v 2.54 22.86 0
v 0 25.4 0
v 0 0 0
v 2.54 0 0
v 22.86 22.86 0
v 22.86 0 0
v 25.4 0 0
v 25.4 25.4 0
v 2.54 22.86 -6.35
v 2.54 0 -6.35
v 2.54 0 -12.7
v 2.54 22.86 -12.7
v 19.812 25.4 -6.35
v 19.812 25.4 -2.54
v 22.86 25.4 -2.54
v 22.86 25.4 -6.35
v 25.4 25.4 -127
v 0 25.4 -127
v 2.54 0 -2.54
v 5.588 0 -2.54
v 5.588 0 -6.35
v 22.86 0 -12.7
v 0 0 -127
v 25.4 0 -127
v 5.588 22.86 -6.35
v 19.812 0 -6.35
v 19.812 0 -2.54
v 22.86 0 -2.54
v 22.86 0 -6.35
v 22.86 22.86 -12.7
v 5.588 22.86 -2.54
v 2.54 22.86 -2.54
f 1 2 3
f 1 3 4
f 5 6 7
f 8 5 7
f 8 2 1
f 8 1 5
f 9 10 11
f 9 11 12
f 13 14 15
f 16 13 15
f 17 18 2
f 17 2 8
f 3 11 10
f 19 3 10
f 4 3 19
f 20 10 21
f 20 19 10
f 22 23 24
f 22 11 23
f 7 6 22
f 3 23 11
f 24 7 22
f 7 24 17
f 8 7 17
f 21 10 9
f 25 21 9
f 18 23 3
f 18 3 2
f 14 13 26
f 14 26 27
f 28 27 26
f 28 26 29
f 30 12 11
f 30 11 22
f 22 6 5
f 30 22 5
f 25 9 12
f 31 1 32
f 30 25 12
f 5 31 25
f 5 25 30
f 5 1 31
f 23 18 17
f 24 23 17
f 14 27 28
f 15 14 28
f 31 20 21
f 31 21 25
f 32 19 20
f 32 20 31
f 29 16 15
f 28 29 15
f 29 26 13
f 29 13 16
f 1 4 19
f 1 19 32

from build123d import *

# Parameters (mm, degrees)
F0_W     = 25.4
F0_H     = 25.4
F1_DEPTH = 127
F2_W     = 20.32
F2_H     = 22.86
F3_DEPTH = 12.7
F4_W     = 22.86
F4_H     = 3.81
F5_DEPTH = 3.048
F6_W     = 3.048
F6_H     = 3.81
F7_DEPTH = 25.4


with BuildPart() as f1:
    # F0 (on Top) → F1 (new body)
    with BuildSketch(Plane.XY):
        with Locations((12.7, 12.7)):
            Rectangle(F0_W, F0_H)
    extrude(amount=-F1_DEPTH)

    # F2 (on face) → F3 (cut)
    with BuildSketch(Plane.XY):
        with Locations((12.7, 11.43)):
            Rectangle(F2_W, F2_H)
    extrude(amount=-F3_DEPTH, mode=Mode.SUBTRACT)

    # F4 (on face) → F5 (join)
    with BuildSketch(Plane.YZ.offset(2.54)):
        with Locations((11.43, -4.445)):
            Rectangle(F4_W, F4_H)
    extrude(amount=F5_DEPTH)


with BuildPart() as f7:
    # F6 (on face) → F7 (new body)
    with BuildSketch(Plane.XZ):
        with Locations((21.336, -4.445)):
            Rectangle(F6_W, F6_H)
    extrude(amount=-F7_DEPTH)


solid = Compound([f1.part, f7.part])
